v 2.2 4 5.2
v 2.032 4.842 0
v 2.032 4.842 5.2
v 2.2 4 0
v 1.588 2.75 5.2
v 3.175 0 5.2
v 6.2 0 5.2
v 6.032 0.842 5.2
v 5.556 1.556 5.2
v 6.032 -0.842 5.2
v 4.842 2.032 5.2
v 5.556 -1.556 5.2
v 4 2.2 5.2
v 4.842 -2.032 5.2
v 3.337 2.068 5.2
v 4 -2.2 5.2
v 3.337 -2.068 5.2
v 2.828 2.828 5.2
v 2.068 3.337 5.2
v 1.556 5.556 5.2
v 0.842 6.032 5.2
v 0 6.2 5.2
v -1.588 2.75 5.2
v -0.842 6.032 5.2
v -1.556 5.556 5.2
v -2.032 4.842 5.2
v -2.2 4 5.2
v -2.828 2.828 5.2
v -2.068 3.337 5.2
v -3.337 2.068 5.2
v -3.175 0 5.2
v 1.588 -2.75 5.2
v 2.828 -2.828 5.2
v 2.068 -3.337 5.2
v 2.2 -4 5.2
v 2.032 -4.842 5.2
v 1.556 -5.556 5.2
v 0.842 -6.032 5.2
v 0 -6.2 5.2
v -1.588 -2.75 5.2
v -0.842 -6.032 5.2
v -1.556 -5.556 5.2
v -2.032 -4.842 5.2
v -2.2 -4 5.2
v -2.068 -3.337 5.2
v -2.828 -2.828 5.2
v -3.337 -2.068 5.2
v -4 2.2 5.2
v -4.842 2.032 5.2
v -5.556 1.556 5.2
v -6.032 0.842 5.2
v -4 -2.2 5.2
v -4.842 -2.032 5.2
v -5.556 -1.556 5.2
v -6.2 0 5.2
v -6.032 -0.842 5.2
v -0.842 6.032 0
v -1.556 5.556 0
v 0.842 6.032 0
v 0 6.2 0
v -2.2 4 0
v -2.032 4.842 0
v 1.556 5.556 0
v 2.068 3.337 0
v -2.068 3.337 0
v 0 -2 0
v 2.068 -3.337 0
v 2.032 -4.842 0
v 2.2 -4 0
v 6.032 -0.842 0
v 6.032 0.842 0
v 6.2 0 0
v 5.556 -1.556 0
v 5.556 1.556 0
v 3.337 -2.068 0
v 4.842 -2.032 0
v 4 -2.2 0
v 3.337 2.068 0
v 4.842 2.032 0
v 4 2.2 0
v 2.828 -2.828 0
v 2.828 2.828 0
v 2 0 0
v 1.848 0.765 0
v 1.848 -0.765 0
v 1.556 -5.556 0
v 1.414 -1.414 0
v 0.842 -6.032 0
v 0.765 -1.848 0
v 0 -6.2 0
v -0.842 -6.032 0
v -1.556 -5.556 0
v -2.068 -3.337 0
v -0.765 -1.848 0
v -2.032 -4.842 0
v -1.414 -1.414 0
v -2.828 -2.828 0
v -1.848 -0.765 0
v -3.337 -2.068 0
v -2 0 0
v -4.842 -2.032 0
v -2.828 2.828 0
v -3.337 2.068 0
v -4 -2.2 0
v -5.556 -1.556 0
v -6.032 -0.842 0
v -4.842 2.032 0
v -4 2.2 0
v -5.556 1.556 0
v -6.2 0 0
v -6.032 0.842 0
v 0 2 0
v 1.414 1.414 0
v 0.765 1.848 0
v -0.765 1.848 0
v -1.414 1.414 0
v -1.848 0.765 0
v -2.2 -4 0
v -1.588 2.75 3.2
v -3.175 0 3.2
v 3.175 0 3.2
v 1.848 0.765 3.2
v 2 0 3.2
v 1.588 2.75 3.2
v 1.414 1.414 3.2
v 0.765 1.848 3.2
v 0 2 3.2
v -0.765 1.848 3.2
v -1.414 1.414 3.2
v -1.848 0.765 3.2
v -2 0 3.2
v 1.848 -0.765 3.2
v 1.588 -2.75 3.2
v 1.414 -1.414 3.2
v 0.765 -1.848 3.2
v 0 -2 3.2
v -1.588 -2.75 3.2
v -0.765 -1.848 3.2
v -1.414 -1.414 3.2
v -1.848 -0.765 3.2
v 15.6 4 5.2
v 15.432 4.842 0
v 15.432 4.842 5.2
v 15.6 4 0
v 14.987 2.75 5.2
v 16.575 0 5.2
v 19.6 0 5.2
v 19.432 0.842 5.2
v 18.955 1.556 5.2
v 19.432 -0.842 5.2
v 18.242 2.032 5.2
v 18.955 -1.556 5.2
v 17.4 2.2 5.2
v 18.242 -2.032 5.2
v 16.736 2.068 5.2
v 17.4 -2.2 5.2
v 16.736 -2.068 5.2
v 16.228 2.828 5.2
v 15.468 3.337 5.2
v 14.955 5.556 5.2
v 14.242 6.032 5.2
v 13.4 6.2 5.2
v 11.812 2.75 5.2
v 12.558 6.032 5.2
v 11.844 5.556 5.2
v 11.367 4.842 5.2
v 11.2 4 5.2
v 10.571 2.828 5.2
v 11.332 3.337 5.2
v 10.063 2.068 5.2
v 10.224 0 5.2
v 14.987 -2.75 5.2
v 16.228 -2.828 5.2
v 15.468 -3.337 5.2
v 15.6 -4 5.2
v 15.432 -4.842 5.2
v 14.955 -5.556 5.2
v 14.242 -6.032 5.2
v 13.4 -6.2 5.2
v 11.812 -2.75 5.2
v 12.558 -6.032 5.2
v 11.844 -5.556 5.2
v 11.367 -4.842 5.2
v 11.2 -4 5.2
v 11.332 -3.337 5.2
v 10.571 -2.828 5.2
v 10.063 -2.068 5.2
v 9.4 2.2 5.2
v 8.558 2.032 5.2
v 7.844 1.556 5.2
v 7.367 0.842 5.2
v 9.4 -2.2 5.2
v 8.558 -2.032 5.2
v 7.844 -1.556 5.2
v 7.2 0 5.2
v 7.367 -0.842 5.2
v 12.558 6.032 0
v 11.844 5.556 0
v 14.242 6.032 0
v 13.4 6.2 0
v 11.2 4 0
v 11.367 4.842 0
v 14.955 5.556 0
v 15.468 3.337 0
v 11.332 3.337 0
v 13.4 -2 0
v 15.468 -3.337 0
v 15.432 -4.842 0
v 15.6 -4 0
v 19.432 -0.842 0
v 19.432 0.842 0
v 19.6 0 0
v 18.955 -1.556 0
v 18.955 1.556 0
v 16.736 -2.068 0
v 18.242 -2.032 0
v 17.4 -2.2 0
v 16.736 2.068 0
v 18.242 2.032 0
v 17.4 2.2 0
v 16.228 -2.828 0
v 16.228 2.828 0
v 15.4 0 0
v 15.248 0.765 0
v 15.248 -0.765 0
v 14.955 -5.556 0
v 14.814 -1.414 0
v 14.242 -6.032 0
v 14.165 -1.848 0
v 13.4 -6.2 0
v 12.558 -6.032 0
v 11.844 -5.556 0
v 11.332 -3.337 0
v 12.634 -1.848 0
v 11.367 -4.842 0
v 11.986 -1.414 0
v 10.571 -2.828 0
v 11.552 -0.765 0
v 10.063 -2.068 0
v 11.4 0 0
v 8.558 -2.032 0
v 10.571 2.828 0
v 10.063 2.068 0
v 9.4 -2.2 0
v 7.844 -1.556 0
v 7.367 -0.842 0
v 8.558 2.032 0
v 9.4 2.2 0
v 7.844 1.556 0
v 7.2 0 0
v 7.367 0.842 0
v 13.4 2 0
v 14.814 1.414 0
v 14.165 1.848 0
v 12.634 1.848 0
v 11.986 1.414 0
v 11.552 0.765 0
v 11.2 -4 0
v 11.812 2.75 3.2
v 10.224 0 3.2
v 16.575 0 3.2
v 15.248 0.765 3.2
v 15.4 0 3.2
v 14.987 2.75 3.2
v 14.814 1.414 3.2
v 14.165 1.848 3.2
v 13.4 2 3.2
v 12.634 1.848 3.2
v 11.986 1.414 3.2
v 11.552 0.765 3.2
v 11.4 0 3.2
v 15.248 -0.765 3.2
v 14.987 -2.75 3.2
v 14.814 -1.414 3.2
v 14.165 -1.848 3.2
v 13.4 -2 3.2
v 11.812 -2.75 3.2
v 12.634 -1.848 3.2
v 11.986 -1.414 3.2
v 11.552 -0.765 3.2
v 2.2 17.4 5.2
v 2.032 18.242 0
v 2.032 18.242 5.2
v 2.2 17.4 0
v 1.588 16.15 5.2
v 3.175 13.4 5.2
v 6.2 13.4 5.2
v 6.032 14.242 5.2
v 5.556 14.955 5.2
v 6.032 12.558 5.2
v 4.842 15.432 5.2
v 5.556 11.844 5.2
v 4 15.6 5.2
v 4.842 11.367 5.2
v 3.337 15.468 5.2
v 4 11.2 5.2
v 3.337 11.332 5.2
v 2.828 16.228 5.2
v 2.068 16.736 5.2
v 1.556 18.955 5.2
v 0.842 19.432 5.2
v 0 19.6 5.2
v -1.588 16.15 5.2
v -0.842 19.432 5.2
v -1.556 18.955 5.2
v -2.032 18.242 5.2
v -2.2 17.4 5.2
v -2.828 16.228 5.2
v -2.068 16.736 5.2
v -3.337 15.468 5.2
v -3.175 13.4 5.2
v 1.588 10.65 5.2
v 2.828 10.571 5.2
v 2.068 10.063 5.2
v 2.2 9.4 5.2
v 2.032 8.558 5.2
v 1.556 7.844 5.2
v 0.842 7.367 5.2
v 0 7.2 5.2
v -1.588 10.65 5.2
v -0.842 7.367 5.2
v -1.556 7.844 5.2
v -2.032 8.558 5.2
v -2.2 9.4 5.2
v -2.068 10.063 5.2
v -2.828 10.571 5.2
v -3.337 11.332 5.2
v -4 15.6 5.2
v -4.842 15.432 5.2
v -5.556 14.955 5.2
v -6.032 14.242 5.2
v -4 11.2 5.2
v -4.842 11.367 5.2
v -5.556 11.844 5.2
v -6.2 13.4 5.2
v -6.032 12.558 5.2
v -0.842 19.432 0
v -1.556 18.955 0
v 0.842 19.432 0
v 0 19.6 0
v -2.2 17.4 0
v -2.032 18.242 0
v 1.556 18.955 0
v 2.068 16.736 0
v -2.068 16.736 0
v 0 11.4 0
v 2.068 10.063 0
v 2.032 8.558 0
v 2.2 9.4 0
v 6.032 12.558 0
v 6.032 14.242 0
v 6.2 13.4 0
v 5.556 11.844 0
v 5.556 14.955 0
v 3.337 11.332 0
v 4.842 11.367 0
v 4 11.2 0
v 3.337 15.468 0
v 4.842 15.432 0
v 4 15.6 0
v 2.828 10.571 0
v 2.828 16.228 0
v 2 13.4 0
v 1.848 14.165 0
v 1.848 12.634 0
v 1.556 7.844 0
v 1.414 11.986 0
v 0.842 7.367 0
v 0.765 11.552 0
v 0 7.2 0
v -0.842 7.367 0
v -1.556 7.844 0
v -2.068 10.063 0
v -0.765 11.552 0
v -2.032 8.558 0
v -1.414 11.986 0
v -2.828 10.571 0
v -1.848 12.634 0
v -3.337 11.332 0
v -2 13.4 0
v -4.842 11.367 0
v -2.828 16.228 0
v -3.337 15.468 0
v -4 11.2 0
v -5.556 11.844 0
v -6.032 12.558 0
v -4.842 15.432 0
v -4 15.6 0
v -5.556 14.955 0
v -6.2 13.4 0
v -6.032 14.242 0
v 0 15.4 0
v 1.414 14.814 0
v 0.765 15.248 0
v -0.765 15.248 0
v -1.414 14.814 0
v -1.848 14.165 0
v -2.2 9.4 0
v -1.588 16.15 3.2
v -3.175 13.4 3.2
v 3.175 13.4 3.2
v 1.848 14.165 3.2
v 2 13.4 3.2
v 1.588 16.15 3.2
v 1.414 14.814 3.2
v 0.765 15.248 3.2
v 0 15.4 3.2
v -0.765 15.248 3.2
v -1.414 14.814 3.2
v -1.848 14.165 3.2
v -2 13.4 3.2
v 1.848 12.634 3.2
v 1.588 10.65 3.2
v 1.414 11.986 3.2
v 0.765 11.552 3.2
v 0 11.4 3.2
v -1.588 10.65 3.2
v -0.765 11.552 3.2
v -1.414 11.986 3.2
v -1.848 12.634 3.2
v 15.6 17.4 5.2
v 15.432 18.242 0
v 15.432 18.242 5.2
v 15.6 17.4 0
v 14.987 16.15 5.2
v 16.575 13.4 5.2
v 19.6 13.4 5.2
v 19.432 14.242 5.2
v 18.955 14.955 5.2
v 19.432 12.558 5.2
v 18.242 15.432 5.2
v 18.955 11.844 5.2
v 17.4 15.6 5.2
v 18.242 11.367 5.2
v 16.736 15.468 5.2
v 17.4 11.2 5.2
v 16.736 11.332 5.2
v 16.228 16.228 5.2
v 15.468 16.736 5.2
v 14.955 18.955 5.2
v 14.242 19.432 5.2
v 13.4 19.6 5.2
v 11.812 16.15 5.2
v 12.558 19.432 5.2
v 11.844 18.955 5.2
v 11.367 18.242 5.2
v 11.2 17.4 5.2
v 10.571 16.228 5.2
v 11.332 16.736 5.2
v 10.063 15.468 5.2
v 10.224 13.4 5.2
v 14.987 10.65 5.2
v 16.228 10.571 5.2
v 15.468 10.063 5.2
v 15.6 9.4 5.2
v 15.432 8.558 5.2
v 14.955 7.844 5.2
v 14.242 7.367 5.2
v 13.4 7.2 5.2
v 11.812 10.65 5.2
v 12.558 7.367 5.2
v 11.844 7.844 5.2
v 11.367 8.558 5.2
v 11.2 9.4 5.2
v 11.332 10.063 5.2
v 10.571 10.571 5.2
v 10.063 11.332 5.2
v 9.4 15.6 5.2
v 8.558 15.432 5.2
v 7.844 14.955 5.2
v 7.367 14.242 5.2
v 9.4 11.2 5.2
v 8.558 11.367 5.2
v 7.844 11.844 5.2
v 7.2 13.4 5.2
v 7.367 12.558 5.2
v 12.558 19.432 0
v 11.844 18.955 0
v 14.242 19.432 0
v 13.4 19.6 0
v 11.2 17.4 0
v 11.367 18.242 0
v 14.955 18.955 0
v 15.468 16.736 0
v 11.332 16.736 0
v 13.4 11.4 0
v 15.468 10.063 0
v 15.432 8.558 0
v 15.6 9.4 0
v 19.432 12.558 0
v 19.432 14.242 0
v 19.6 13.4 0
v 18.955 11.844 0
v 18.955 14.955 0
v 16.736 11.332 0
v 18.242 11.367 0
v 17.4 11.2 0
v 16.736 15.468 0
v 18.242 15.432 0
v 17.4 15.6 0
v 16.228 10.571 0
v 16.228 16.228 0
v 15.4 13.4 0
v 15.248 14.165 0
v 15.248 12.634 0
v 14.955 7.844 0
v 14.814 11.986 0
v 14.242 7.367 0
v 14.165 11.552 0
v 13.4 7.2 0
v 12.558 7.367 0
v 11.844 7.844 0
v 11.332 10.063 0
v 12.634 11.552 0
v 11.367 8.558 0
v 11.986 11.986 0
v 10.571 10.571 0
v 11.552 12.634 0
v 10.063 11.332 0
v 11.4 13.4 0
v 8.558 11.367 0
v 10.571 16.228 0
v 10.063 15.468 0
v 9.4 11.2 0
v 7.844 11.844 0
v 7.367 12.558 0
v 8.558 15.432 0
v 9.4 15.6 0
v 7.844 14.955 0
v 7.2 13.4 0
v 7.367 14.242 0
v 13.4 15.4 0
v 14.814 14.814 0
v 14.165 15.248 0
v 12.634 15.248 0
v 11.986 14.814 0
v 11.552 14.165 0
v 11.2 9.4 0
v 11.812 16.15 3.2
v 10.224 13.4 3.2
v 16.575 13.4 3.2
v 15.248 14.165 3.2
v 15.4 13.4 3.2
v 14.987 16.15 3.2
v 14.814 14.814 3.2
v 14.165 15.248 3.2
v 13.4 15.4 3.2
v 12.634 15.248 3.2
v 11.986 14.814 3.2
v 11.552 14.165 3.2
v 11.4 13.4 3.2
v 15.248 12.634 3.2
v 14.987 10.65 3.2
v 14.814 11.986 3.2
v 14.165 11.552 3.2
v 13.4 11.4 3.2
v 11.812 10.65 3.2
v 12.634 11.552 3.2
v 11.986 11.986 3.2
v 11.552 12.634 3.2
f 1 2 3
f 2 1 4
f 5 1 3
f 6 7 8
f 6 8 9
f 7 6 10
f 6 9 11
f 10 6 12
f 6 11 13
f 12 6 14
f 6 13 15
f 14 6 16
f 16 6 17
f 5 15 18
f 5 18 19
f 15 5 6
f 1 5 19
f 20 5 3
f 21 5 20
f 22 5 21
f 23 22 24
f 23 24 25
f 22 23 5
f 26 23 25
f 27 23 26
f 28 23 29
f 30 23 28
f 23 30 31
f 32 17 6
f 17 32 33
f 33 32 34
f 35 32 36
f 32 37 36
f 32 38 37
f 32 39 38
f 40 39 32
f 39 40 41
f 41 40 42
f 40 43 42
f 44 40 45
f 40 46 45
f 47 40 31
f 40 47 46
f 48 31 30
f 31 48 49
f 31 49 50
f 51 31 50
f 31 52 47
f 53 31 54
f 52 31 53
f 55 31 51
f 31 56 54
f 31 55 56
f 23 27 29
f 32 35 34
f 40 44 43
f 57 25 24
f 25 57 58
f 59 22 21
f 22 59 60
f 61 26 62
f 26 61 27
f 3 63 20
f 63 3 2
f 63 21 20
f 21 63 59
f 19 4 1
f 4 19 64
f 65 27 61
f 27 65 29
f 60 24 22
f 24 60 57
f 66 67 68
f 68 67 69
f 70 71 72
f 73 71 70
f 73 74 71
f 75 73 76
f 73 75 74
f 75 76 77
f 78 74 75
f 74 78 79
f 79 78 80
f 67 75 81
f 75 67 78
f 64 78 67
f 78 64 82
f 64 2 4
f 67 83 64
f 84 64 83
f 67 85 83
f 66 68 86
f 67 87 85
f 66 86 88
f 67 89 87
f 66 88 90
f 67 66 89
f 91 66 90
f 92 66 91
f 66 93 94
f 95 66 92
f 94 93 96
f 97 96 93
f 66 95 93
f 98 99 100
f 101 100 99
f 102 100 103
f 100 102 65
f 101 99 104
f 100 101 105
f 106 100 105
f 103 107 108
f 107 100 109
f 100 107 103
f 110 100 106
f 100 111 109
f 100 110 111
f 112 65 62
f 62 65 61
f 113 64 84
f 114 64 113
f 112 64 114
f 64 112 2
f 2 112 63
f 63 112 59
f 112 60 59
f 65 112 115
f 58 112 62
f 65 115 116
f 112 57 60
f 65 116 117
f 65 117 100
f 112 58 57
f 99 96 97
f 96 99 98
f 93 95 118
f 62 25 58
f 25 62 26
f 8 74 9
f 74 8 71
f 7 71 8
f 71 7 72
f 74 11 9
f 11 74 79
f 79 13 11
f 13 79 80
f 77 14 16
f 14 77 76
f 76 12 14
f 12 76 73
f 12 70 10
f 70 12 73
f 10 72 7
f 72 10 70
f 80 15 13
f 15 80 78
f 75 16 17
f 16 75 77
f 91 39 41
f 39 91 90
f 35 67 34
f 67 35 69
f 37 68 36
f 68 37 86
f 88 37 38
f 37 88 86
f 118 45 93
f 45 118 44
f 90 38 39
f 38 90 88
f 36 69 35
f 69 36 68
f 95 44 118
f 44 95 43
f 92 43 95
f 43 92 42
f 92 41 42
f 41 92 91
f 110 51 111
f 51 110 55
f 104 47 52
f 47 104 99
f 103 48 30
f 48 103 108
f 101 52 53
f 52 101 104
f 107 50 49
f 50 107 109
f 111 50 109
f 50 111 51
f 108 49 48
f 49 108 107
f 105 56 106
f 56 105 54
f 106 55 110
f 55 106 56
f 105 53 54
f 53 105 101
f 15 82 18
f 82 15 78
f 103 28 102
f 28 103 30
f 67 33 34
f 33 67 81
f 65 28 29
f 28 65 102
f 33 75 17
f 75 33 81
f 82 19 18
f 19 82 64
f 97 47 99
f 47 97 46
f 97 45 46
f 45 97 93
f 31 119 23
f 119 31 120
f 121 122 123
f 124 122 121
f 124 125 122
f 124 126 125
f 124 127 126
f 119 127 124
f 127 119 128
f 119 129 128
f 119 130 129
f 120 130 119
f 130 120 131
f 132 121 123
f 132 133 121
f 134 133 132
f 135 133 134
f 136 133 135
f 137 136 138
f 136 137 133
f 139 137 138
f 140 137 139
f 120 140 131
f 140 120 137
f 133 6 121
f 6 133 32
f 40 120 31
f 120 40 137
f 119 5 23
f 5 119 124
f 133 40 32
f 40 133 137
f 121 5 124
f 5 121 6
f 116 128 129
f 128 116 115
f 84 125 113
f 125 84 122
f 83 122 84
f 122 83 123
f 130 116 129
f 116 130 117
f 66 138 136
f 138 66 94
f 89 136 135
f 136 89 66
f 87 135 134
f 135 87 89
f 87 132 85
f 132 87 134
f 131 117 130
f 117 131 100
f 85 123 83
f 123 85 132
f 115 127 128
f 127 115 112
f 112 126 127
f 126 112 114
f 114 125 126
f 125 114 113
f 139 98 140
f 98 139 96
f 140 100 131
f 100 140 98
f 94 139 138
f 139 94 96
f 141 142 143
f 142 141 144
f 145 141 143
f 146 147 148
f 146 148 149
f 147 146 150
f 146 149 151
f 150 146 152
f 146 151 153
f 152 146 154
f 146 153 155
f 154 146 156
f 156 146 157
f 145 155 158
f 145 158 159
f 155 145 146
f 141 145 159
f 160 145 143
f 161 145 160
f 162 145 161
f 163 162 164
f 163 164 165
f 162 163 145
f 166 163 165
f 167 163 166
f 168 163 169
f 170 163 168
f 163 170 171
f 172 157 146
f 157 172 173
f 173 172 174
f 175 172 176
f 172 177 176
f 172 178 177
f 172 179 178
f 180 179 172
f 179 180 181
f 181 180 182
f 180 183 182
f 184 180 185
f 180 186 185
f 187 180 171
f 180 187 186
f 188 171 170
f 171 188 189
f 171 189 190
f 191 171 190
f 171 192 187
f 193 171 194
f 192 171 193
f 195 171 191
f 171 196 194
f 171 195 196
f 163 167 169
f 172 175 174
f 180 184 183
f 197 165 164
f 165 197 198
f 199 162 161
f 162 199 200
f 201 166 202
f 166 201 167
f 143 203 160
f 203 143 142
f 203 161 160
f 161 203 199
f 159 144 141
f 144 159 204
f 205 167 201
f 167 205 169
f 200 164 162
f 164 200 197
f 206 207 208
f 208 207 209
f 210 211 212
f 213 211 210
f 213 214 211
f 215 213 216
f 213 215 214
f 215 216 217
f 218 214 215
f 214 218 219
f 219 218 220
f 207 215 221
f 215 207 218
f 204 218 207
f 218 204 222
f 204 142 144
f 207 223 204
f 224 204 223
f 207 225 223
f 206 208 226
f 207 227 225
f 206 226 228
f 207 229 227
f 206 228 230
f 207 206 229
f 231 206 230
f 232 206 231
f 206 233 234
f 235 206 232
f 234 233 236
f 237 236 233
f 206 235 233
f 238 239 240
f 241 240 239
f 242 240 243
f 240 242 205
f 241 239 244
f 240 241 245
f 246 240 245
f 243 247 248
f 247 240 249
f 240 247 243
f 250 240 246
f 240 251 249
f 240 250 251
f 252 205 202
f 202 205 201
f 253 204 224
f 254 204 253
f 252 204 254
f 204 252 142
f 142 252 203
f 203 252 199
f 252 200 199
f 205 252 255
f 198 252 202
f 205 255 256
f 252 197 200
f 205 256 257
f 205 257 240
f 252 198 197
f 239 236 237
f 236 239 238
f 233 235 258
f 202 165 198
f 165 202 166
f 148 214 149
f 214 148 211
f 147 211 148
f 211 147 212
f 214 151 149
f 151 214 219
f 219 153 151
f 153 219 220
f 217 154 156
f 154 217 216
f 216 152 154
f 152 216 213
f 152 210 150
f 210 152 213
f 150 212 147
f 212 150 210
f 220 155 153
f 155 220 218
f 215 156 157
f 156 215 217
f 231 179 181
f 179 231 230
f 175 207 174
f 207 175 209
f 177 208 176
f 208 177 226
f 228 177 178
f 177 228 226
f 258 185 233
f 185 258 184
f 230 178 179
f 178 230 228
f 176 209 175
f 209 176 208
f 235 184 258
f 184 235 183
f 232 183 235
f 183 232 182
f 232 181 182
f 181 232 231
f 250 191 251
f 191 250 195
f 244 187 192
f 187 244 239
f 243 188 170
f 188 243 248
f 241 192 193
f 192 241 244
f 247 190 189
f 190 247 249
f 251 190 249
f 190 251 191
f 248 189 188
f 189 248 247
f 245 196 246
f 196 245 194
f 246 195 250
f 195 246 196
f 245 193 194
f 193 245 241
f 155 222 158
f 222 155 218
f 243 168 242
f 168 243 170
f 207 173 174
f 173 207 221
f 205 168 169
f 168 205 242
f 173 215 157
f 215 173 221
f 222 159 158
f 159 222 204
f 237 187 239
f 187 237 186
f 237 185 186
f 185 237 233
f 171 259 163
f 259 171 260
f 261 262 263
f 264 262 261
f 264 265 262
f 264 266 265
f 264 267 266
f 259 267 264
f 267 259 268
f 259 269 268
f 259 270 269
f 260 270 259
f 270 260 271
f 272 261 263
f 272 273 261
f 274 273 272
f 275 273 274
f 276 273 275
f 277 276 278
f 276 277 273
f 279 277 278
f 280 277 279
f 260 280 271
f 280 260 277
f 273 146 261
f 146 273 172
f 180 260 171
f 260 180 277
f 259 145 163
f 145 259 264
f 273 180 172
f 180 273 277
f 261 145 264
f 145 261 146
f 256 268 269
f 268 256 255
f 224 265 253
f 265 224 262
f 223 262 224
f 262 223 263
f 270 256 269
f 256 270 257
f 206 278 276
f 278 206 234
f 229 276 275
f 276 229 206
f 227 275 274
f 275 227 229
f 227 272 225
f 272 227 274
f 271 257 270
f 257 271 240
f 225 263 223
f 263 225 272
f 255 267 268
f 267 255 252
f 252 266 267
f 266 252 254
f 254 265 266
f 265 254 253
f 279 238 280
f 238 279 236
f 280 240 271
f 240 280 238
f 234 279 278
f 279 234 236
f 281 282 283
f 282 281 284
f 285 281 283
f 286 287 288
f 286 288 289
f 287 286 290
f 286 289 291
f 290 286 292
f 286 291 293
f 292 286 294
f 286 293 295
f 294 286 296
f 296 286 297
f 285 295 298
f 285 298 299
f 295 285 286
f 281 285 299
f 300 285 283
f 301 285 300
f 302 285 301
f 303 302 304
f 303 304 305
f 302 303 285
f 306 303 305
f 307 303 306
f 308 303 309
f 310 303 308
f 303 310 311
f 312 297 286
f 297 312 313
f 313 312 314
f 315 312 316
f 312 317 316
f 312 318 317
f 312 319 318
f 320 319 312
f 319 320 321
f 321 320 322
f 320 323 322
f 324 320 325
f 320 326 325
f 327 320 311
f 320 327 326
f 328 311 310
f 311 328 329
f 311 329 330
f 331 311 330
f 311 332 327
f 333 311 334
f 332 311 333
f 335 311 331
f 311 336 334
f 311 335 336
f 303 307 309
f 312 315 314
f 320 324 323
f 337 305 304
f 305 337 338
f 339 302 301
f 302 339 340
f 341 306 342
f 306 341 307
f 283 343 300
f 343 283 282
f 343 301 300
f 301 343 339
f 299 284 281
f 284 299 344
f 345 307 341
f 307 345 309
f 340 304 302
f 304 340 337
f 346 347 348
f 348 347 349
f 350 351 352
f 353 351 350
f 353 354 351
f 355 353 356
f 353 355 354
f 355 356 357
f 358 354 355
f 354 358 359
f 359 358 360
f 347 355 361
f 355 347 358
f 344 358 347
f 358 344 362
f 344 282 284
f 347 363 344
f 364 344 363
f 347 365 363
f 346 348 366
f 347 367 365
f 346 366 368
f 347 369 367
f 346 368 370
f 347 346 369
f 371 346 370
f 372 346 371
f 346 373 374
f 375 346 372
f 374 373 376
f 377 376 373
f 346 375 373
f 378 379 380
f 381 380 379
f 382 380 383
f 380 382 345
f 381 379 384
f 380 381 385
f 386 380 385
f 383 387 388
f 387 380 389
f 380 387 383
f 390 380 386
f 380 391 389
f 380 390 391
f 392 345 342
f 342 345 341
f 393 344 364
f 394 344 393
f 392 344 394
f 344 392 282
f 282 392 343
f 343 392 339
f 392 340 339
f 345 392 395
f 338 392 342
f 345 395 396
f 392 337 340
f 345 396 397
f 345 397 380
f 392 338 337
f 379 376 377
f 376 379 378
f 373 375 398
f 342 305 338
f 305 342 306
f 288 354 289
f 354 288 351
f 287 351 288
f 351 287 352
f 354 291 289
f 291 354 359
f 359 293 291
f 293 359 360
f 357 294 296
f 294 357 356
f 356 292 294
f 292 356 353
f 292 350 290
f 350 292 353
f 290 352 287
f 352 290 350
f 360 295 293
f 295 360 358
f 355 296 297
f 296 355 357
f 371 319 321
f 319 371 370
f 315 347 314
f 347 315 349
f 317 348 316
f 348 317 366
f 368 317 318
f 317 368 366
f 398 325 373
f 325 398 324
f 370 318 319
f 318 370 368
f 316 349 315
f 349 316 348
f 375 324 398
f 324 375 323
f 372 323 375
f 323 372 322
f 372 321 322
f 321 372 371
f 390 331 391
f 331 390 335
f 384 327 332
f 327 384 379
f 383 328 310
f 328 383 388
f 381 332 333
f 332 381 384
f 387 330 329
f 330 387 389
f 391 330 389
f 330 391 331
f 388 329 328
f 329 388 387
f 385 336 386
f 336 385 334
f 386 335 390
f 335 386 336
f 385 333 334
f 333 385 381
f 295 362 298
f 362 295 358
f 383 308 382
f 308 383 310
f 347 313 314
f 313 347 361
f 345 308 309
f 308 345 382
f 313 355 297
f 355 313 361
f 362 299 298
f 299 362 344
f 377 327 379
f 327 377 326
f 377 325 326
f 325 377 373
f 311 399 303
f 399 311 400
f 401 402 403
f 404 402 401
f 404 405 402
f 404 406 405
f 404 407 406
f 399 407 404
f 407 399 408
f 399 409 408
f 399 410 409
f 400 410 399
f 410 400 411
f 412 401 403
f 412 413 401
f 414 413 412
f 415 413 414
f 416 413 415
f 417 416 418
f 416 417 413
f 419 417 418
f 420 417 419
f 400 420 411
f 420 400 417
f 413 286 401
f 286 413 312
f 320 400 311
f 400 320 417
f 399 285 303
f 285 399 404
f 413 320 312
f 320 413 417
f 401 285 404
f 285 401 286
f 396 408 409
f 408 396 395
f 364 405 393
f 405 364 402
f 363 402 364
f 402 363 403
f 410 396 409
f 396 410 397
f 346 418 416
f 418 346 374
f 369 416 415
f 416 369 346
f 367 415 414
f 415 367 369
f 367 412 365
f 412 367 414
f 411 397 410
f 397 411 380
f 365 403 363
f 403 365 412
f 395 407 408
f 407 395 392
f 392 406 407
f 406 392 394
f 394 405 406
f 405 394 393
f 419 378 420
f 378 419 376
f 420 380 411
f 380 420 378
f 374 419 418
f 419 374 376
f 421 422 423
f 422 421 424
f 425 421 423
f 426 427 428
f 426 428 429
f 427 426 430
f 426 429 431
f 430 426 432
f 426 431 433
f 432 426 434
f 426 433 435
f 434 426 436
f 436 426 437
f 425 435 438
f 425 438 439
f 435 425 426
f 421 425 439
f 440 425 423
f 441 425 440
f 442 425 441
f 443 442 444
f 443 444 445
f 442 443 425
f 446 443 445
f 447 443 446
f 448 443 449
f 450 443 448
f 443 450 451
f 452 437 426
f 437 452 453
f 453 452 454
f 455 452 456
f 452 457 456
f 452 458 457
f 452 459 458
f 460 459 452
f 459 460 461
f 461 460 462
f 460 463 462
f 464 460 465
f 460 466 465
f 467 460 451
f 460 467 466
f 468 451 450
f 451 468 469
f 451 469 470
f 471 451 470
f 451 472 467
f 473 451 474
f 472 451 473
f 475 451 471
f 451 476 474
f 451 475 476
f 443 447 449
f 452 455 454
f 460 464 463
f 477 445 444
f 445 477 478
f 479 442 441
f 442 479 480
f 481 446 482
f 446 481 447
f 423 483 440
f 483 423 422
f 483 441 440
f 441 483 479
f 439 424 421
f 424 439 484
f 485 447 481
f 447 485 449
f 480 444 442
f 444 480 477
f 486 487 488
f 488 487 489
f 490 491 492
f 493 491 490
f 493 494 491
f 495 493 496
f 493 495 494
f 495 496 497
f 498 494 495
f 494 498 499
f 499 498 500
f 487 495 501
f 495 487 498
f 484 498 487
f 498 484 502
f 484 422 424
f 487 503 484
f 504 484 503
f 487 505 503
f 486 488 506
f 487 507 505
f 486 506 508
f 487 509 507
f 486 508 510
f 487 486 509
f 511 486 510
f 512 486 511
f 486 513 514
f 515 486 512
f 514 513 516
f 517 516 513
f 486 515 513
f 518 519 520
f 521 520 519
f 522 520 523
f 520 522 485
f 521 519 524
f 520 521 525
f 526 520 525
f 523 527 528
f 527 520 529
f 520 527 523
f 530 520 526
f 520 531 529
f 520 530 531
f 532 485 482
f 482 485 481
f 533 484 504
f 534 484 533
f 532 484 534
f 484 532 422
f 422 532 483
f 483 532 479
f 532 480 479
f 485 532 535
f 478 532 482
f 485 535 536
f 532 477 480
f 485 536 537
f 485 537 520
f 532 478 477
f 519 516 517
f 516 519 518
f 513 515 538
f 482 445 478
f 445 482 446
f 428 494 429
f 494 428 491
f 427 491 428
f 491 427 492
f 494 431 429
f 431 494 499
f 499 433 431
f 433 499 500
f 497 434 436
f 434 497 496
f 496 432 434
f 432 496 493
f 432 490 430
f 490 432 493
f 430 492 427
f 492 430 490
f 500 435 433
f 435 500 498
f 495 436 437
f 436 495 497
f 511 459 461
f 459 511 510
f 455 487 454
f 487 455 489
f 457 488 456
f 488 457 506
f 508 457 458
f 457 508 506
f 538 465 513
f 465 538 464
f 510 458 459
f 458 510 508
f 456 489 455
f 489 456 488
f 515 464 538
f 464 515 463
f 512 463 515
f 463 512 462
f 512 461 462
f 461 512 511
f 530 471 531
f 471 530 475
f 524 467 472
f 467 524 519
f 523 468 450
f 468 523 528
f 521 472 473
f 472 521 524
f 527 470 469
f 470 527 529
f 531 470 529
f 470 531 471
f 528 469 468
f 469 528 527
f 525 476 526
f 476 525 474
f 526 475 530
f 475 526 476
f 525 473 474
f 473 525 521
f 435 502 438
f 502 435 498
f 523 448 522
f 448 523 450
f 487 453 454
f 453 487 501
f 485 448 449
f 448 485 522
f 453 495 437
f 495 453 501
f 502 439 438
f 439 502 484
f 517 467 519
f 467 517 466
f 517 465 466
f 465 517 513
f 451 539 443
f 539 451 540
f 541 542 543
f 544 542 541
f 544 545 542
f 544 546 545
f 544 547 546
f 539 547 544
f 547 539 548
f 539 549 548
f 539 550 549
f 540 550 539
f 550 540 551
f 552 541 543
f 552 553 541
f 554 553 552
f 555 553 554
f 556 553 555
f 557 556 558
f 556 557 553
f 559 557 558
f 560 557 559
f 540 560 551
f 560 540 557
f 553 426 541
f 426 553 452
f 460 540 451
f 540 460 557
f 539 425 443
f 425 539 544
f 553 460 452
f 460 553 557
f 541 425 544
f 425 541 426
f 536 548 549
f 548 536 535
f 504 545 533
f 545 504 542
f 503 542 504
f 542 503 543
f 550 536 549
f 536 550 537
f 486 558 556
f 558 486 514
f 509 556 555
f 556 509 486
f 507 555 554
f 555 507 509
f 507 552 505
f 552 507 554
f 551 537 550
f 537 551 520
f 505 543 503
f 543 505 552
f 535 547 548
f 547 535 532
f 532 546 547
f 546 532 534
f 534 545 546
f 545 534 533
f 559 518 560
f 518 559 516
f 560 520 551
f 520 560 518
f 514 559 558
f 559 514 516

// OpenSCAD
// Thumbwheel for nuts, suitable for M3 nyloc and M3 standard nuts
// by Andy Gock
//
// With rounded thingies on the outside for gripping
//
// The nut recess should be a tight fit and will need a press
// vice or a hammer to fit the nut inside. A bit of superglue
// is also a good idea prior to fitting.

pi = 3.1427*1;

// To change between M3 standard nut or nyloc, we need to change the variables:
// knob_height, nut_height

// use 4.00 for standard nut, 5.20 for full nyloc
knob_height = 5.2; 
knob_diameter = 8.0;
knurl_count = 4;
knurl_diameter = 0.7 * knob_diameter * pi / knurl_count;
nut_width_flats = 5.50;

// set to 1 to make an array of 4 thumbwheels, set to 0 for just one thumbwheel
make_quad_array = 1; 

// This height determines the recess for the nut to press into
// Make this a little less than the actual nut height as we want
// a little bit of nut sticking out
// Note: 2.44mm is actual nut height for M3 half nut, 3.85mm is actual nut height for M3 nyloc
// use 2.00 for standard nut, use 3.20 for nyloc
nut_height = 2.00; 
// use 4.0 for a M3 screw thread
hole_diameter = 4.0; 

// Don't change, this is for the rendering of difference() to look nice
diff_fudge = 0.1*1;

$fn = 16*1;

// one nut
translate([0,0,0])
	thumbwheel();

if (make_quad_array == 1) {
	// make array of nuts (not including first one)
	
	translate([knob_diameter+knurl_diameter+1,0,0])
		thumbwheel();

	translate([0,knob_diameter+knurl_diameter+1,0])
		thumbwheel();
		
	translate([knob_diameter+knurl_diameter+1,knob_diameter+knurl_diameter+1,0])
		thumbwheel();

}

module thumbwheel(knob_height=knob_height, knob_diameter=knob_diameter, knurl_count=knurl_count, nut_width_flats=nut_width_flats, nut_height=nut_height, hole_diameter=hole_diameter) {

	difference() {

		union() {

			// make main cylinder
			cylinder(h=knob_height, r1=knob_diameter/2, r2=knob_diameter/2);

			// make other cylinders
			for (i = [0:(knurl_count-1)])
			{
				translate([knob_diameter/2 * sin(i*360/knurl_count), knob_diameter/2 * cos(i*360/knurl_count),0])
					cylinder(h=knob_height, r1=knurl_diameter/2, r2=knurl_diameter/2);
			}

		}

		// cut out for the nut hole
		translate([0,0,knob_height-nut_height])
			hexagon_prism( nut_height+diff_fudge, (nut_width_flats/2) / sin(60));

		// center hole for the screw to go through
		translate([0,0,-diff_fudge])
			cylinder(h = knob_height*2, r1=hole_diameter/2, r2=hole_diameter/2);

	}

}

module hexagon_prism(height,radius)
{
  linear_extrude(height=height) circle(r=radius,$fn=6);
}
